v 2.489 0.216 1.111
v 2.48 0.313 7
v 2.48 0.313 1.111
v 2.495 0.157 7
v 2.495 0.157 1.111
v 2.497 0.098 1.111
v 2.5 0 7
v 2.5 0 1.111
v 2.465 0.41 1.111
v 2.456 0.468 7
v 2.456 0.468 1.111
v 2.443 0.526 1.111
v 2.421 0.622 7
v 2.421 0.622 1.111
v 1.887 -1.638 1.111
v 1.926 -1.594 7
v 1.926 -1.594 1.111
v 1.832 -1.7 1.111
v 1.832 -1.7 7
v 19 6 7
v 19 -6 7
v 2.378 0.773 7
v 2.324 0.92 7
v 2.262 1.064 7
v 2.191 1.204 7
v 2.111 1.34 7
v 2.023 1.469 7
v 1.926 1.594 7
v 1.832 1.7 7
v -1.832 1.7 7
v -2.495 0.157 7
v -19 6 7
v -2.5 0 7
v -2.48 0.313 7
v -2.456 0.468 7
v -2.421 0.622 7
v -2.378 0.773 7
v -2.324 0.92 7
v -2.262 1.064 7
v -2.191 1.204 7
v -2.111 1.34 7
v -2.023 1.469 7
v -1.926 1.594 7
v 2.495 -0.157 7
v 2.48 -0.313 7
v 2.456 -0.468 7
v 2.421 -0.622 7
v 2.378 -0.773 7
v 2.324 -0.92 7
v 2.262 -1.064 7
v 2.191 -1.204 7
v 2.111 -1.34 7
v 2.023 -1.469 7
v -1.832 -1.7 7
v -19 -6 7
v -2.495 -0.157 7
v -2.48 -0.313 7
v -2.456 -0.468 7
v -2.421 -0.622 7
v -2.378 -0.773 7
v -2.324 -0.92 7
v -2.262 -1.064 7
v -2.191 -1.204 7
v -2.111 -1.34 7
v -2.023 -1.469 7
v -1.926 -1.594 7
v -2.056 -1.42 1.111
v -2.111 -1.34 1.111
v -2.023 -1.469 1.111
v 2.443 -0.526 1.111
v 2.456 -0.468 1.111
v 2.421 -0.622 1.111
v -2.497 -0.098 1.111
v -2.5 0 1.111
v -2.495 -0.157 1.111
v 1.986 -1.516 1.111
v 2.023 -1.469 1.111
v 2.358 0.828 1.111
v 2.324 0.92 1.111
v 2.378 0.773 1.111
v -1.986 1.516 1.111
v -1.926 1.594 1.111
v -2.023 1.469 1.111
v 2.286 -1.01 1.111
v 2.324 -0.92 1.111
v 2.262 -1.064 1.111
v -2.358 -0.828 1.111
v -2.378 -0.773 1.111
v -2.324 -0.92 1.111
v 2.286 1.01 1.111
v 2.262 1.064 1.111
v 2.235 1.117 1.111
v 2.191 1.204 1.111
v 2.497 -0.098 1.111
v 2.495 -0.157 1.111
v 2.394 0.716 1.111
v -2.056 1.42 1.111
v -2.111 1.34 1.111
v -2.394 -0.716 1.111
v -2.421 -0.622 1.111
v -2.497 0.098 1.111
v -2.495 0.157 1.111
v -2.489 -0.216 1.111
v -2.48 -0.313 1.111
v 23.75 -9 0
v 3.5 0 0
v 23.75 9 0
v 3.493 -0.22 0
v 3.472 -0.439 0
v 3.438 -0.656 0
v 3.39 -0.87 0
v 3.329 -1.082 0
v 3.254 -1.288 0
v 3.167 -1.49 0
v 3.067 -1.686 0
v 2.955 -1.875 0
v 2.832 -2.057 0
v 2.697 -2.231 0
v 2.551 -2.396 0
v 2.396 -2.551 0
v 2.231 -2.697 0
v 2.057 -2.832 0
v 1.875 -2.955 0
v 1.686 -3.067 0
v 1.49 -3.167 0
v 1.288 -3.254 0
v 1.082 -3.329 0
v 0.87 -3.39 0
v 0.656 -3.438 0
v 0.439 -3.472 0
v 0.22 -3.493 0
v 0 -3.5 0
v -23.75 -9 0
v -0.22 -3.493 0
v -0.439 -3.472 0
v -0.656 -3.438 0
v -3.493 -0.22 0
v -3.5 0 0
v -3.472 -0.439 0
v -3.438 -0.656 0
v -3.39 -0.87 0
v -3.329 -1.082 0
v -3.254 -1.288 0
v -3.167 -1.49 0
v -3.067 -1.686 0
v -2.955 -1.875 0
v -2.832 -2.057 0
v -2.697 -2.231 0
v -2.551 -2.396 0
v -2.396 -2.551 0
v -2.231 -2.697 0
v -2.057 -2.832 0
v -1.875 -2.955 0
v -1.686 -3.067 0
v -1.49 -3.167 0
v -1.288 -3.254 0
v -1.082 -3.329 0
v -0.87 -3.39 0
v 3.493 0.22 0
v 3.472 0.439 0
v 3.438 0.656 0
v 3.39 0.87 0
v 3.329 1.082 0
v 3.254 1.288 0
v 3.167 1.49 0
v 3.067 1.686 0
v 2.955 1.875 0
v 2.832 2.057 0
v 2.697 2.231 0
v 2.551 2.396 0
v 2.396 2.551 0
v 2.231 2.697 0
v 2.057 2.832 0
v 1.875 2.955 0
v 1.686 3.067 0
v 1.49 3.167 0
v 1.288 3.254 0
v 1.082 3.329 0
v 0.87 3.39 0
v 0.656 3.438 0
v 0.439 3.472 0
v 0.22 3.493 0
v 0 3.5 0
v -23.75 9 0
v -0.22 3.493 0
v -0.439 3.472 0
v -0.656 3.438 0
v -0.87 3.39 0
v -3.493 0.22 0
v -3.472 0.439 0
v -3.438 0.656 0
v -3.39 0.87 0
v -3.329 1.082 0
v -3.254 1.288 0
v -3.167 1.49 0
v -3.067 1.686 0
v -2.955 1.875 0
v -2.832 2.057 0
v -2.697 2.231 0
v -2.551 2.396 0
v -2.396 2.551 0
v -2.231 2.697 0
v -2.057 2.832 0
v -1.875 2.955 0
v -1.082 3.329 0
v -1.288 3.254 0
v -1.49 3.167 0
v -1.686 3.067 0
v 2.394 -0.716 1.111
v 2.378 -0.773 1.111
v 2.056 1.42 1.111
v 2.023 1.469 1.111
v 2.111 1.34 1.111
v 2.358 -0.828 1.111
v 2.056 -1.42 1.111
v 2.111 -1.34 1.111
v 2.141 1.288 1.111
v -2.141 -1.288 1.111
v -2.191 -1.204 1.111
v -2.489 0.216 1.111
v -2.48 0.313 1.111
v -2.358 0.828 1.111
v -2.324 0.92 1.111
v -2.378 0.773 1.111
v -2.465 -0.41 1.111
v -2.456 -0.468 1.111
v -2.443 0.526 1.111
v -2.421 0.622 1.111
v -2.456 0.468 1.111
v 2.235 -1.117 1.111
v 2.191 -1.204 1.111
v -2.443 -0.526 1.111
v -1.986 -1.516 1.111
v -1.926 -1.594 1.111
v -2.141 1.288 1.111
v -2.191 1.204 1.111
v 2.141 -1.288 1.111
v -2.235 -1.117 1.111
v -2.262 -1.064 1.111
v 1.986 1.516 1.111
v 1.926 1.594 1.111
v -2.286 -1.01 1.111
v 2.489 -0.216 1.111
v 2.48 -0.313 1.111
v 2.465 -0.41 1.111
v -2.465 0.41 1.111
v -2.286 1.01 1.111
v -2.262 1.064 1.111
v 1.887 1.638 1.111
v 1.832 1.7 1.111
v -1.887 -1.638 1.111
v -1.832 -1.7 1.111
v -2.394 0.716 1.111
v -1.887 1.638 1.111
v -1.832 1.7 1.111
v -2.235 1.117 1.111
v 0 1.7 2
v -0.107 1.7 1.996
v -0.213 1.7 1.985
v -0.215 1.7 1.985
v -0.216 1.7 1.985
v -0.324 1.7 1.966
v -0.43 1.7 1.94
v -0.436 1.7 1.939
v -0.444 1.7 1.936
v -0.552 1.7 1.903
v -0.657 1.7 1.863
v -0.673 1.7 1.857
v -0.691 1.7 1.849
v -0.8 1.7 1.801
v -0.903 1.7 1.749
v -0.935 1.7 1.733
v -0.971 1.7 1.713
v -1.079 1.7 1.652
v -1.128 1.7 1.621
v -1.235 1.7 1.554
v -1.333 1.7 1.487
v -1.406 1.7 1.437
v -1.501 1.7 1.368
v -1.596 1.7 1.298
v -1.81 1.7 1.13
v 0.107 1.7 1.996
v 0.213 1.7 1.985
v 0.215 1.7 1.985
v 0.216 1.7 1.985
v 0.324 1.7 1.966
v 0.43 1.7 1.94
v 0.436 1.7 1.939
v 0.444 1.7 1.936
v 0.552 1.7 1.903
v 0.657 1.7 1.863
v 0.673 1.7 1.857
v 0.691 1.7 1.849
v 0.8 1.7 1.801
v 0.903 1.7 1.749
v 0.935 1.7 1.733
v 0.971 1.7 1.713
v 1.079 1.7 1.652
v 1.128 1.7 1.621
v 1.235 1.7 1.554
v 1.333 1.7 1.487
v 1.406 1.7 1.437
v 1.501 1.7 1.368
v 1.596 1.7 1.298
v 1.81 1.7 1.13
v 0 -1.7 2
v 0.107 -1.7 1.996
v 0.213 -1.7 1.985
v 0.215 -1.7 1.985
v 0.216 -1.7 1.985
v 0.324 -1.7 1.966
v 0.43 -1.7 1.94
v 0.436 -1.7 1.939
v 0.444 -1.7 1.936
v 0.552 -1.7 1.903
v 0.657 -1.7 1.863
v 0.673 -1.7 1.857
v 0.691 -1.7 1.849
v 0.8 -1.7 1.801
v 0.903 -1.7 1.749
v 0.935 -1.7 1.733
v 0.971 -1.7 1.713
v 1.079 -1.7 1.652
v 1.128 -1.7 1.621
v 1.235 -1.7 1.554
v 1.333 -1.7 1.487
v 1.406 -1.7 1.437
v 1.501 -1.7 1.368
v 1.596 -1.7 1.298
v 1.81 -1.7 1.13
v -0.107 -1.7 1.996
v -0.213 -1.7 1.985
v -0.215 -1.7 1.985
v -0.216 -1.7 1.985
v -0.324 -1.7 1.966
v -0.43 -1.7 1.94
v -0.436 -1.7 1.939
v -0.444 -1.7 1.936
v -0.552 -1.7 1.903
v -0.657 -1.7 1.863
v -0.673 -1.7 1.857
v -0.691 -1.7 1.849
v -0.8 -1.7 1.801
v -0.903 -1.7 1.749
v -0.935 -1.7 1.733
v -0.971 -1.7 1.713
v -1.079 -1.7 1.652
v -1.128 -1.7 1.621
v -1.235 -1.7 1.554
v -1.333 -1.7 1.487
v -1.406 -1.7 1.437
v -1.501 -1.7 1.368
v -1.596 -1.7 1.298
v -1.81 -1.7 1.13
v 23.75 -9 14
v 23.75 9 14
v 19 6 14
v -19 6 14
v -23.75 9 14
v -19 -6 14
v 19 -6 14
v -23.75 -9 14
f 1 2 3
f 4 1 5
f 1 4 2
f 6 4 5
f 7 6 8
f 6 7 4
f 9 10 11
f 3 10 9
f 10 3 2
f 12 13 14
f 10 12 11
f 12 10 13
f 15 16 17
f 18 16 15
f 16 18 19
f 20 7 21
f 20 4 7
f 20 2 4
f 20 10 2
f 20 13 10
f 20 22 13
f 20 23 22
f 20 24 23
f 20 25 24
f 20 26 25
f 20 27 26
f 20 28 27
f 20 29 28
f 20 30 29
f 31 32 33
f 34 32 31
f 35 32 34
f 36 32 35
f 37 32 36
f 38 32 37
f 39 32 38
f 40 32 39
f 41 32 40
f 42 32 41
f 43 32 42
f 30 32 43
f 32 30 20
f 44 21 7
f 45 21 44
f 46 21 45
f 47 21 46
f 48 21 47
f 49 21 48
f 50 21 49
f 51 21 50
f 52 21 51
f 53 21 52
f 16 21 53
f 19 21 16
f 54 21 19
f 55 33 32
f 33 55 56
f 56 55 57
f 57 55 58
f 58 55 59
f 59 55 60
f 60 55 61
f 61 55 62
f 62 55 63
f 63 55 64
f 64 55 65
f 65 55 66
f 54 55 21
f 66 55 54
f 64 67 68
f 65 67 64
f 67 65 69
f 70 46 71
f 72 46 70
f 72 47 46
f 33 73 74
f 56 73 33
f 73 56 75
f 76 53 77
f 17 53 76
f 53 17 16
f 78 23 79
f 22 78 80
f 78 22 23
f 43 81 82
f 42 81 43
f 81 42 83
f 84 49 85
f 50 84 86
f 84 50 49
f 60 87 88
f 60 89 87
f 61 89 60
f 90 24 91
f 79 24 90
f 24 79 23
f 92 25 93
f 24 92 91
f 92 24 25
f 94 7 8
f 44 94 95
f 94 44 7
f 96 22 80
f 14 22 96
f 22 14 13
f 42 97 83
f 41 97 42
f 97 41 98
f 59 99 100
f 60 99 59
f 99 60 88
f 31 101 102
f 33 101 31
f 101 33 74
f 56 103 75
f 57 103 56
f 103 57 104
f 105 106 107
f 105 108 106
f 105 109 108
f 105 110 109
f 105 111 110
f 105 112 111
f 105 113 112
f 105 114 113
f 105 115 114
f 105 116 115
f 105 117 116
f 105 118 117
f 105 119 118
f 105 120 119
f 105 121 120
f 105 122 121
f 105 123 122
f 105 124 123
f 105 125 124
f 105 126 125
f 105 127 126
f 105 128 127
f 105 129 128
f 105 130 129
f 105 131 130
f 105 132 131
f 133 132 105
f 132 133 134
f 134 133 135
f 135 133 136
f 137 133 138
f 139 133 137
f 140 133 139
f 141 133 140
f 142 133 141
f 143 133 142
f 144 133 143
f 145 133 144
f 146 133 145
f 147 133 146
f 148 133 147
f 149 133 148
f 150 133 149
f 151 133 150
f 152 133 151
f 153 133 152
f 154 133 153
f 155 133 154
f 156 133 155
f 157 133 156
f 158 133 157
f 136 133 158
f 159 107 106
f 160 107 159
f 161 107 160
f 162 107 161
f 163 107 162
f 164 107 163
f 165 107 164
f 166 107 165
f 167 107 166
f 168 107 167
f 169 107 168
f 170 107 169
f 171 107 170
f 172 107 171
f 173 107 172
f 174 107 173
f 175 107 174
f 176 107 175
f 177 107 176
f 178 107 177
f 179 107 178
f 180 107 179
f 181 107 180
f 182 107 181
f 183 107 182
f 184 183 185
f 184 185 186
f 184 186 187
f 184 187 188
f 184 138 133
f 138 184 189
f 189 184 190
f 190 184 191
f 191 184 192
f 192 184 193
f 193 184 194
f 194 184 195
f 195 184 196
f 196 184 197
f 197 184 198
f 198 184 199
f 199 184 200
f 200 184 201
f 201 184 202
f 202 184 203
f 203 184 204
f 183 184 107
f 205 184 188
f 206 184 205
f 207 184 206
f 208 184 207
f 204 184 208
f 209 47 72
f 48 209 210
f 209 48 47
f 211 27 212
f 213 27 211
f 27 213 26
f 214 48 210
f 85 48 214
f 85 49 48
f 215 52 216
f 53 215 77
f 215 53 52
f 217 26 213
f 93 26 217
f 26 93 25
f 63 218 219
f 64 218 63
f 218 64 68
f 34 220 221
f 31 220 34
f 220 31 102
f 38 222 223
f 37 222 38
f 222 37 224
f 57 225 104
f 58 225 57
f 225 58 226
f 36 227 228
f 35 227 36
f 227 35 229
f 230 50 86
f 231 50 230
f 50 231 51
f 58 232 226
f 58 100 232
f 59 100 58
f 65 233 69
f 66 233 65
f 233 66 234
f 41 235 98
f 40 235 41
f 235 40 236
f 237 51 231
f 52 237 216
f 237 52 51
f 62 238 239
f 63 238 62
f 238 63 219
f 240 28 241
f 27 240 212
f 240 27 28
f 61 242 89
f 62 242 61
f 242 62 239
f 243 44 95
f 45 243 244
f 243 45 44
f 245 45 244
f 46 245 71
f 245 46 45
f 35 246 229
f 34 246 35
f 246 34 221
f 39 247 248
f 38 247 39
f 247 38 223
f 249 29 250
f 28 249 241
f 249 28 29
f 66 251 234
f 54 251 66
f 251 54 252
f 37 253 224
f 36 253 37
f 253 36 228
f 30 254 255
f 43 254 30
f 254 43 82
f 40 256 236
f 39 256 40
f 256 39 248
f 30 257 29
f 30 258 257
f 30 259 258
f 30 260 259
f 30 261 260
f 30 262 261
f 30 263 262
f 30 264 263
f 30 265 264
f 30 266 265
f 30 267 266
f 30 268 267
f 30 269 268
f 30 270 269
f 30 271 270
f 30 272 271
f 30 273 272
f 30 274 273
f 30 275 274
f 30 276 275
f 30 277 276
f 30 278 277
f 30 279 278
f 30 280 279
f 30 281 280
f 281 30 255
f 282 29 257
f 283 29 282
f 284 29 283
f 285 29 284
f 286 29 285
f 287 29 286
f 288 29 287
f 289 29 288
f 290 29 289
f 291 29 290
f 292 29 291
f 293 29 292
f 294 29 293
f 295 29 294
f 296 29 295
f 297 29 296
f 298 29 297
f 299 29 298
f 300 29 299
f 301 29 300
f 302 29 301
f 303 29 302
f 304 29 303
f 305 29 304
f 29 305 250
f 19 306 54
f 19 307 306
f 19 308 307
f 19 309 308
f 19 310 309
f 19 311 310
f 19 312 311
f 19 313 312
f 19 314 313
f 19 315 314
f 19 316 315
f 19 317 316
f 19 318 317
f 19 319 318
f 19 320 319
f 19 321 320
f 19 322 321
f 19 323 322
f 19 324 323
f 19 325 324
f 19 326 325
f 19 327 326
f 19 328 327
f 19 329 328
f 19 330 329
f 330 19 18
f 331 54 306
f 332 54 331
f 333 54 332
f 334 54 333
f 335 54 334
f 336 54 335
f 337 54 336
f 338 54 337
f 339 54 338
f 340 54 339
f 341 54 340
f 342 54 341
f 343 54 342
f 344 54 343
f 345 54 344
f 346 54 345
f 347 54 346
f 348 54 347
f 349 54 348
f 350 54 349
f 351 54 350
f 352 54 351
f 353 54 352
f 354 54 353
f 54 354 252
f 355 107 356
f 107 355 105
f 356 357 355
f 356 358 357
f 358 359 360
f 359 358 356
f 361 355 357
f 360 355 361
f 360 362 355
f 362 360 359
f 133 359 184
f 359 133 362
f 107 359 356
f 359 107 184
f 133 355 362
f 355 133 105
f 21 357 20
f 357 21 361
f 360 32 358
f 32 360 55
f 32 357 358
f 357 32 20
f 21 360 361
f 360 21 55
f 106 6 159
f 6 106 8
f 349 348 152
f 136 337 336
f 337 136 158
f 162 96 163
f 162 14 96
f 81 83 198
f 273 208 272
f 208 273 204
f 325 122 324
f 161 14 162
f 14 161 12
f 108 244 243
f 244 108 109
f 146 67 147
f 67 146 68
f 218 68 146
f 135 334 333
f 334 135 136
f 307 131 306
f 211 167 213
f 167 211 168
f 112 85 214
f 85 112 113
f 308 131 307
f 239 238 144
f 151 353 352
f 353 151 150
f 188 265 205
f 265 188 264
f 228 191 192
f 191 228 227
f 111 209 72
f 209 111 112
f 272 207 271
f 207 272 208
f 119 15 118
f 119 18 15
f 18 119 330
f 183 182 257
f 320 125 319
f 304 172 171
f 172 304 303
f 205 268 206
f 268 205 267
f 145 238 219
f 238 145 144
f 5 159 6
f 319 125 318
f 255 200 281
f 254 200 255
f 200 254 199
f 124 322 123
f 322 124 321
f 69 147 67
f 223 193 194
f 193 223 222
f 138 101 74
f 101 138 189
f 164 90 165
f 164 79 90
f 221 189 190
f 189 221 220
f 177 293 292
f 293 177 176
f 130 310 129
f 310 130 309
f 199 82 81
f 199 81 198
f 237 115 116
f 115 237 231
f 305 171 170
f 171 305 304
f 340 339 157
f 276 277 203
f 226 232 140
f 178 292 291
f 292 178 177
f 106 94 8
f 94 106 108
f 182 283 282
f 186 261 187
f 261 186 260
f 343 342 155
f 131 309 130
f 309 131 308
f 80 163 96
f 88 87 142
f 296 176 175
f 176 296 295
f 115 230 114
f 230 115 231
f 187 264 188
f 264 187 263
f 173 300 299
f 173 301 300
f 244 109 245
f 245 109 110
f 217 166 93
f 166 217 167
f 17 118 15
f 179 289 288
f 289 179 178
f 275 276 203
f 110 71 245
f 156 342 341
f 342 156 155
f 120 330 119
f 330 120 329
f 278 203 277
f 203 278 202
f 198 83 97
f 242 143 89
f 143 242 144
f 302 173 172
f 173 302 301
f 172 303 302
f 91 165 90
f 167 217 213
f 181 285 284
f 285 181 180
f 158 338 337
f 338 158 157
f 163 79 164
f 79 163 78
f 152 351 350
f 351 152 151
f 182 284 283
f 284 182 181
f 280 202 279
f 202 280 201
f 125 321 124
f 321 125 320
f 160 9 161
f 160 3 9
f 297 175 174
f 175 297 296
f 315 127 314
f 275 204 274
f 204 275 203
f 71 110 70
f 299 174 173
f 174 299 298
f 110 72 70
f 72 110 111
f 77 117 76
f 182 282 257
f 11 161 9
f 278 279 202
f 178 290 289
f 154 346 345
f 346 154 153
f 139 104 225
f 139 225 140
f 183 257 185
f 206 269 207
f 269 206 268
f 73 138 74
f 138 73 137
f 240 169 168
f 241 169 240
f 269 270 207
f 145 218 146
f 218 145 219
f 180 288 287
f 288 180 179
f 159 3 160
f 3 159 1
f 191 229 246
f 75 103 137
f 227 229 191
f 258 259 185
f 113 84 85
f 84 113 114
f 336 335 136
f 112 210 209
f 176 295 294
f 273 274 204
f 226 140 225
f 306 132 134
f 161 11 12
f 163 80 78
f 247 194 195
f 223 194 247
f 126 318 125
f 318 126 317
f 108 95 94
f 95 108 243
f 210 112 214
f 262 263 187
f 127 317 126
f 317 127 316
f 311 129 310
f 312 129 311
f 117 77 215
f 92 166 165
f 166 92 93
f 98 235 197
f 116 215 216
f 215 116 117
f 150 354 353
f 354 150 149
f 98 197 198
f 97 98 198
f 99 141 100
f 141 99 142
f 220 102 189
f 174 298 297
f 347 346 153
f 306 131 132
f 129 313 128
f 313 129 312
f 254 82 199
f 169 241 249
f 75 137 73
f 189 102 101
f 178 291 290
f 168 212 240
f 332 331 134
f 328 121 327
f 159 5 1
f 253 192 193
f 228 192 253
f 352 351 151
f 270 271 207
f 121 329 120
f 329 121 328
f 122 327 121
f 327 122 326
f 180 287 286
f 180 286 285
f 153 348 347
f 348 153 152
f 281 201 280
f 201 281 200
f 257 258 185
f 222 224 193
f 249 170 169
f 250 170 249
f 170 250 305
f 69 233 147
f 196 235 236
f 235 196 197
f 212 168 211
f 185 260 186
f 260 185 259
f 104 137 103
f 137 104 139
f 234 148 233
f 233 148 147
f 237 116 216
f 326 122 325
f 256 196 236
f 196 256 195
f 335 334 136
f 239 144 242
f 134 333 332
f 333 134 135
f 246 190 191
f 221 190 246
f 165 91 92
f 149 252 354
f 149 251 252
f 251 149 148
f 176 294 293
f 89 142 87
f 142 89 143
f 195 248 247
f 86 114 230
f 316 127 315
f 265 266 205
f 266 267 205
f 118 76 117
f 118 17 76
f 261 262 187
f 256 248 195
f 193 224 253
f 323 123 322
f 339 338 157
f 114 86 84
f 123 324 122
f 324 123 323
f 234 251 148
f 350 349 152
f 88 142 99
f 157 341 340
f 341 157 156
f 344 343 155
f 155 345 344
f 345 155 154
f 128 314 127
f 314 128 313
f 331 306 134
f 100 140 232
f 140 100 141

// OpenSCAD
// shaft dia = 5
// flat bit = 3
// length = 8.5
// flat length = 6

// Next: Do a chamfer where motor shaft comes in

tolerance = 1;
dial_breadth = 37 + tolerance;
dial_width = 11  + tolerance ;
dial_height = 7 + tolerance;



offset_r = 2.5;
offset_height = 2.5;
shaft_flat_height = 6;
shaft_flat_r = 2.5;
total_height_shaft = shaft_flat_height + offset_height;


interface_breadth = dial_breadth * 5 / 4;
interface_width = dial_width * 6 / 4;
interface_height = shaft_flat_height + dial_height;


inter_cube_x = shaft_flat_r * 5;
inter_cube_y = 1.7 * 2;





difference(){
    translate([-interface_breadth / 2, -interface_width / 2, 0])
    cube(size = [interface_breadth , interface_width , interface_height], center = false);

    // dial
    translate([-dial_breadth / 2, -dial_width / 2, shaft_flat_height + tolerance])
    cube(size = [dial_breadth, dial_width, dial_height], center = false);


//shaft
translate([0, 0, -offset_height])
cylinder(h=offset_height, r1=offset_r, r2=offset_r, center=false, $fn=100);

intersection() {
  cylinder(h=shaft_flat_height + tolerance, r1=shaft_flat_r, r2=shaft_flat_r, center=false, $fn=100);
  translate([-inter_cube_x / 2, -inter_cube_y / 2, 0.0])
  cube([inter_cube_x, inter_cube_y, shaft_flat_height + tolerance]);
}

// Chamfer
chamfer_height = 2.0;
cylinder(h=chamfer_height, r1=offset_r + 1, r2=inter_cube_y / 2, center=false, $fn=100);

}
